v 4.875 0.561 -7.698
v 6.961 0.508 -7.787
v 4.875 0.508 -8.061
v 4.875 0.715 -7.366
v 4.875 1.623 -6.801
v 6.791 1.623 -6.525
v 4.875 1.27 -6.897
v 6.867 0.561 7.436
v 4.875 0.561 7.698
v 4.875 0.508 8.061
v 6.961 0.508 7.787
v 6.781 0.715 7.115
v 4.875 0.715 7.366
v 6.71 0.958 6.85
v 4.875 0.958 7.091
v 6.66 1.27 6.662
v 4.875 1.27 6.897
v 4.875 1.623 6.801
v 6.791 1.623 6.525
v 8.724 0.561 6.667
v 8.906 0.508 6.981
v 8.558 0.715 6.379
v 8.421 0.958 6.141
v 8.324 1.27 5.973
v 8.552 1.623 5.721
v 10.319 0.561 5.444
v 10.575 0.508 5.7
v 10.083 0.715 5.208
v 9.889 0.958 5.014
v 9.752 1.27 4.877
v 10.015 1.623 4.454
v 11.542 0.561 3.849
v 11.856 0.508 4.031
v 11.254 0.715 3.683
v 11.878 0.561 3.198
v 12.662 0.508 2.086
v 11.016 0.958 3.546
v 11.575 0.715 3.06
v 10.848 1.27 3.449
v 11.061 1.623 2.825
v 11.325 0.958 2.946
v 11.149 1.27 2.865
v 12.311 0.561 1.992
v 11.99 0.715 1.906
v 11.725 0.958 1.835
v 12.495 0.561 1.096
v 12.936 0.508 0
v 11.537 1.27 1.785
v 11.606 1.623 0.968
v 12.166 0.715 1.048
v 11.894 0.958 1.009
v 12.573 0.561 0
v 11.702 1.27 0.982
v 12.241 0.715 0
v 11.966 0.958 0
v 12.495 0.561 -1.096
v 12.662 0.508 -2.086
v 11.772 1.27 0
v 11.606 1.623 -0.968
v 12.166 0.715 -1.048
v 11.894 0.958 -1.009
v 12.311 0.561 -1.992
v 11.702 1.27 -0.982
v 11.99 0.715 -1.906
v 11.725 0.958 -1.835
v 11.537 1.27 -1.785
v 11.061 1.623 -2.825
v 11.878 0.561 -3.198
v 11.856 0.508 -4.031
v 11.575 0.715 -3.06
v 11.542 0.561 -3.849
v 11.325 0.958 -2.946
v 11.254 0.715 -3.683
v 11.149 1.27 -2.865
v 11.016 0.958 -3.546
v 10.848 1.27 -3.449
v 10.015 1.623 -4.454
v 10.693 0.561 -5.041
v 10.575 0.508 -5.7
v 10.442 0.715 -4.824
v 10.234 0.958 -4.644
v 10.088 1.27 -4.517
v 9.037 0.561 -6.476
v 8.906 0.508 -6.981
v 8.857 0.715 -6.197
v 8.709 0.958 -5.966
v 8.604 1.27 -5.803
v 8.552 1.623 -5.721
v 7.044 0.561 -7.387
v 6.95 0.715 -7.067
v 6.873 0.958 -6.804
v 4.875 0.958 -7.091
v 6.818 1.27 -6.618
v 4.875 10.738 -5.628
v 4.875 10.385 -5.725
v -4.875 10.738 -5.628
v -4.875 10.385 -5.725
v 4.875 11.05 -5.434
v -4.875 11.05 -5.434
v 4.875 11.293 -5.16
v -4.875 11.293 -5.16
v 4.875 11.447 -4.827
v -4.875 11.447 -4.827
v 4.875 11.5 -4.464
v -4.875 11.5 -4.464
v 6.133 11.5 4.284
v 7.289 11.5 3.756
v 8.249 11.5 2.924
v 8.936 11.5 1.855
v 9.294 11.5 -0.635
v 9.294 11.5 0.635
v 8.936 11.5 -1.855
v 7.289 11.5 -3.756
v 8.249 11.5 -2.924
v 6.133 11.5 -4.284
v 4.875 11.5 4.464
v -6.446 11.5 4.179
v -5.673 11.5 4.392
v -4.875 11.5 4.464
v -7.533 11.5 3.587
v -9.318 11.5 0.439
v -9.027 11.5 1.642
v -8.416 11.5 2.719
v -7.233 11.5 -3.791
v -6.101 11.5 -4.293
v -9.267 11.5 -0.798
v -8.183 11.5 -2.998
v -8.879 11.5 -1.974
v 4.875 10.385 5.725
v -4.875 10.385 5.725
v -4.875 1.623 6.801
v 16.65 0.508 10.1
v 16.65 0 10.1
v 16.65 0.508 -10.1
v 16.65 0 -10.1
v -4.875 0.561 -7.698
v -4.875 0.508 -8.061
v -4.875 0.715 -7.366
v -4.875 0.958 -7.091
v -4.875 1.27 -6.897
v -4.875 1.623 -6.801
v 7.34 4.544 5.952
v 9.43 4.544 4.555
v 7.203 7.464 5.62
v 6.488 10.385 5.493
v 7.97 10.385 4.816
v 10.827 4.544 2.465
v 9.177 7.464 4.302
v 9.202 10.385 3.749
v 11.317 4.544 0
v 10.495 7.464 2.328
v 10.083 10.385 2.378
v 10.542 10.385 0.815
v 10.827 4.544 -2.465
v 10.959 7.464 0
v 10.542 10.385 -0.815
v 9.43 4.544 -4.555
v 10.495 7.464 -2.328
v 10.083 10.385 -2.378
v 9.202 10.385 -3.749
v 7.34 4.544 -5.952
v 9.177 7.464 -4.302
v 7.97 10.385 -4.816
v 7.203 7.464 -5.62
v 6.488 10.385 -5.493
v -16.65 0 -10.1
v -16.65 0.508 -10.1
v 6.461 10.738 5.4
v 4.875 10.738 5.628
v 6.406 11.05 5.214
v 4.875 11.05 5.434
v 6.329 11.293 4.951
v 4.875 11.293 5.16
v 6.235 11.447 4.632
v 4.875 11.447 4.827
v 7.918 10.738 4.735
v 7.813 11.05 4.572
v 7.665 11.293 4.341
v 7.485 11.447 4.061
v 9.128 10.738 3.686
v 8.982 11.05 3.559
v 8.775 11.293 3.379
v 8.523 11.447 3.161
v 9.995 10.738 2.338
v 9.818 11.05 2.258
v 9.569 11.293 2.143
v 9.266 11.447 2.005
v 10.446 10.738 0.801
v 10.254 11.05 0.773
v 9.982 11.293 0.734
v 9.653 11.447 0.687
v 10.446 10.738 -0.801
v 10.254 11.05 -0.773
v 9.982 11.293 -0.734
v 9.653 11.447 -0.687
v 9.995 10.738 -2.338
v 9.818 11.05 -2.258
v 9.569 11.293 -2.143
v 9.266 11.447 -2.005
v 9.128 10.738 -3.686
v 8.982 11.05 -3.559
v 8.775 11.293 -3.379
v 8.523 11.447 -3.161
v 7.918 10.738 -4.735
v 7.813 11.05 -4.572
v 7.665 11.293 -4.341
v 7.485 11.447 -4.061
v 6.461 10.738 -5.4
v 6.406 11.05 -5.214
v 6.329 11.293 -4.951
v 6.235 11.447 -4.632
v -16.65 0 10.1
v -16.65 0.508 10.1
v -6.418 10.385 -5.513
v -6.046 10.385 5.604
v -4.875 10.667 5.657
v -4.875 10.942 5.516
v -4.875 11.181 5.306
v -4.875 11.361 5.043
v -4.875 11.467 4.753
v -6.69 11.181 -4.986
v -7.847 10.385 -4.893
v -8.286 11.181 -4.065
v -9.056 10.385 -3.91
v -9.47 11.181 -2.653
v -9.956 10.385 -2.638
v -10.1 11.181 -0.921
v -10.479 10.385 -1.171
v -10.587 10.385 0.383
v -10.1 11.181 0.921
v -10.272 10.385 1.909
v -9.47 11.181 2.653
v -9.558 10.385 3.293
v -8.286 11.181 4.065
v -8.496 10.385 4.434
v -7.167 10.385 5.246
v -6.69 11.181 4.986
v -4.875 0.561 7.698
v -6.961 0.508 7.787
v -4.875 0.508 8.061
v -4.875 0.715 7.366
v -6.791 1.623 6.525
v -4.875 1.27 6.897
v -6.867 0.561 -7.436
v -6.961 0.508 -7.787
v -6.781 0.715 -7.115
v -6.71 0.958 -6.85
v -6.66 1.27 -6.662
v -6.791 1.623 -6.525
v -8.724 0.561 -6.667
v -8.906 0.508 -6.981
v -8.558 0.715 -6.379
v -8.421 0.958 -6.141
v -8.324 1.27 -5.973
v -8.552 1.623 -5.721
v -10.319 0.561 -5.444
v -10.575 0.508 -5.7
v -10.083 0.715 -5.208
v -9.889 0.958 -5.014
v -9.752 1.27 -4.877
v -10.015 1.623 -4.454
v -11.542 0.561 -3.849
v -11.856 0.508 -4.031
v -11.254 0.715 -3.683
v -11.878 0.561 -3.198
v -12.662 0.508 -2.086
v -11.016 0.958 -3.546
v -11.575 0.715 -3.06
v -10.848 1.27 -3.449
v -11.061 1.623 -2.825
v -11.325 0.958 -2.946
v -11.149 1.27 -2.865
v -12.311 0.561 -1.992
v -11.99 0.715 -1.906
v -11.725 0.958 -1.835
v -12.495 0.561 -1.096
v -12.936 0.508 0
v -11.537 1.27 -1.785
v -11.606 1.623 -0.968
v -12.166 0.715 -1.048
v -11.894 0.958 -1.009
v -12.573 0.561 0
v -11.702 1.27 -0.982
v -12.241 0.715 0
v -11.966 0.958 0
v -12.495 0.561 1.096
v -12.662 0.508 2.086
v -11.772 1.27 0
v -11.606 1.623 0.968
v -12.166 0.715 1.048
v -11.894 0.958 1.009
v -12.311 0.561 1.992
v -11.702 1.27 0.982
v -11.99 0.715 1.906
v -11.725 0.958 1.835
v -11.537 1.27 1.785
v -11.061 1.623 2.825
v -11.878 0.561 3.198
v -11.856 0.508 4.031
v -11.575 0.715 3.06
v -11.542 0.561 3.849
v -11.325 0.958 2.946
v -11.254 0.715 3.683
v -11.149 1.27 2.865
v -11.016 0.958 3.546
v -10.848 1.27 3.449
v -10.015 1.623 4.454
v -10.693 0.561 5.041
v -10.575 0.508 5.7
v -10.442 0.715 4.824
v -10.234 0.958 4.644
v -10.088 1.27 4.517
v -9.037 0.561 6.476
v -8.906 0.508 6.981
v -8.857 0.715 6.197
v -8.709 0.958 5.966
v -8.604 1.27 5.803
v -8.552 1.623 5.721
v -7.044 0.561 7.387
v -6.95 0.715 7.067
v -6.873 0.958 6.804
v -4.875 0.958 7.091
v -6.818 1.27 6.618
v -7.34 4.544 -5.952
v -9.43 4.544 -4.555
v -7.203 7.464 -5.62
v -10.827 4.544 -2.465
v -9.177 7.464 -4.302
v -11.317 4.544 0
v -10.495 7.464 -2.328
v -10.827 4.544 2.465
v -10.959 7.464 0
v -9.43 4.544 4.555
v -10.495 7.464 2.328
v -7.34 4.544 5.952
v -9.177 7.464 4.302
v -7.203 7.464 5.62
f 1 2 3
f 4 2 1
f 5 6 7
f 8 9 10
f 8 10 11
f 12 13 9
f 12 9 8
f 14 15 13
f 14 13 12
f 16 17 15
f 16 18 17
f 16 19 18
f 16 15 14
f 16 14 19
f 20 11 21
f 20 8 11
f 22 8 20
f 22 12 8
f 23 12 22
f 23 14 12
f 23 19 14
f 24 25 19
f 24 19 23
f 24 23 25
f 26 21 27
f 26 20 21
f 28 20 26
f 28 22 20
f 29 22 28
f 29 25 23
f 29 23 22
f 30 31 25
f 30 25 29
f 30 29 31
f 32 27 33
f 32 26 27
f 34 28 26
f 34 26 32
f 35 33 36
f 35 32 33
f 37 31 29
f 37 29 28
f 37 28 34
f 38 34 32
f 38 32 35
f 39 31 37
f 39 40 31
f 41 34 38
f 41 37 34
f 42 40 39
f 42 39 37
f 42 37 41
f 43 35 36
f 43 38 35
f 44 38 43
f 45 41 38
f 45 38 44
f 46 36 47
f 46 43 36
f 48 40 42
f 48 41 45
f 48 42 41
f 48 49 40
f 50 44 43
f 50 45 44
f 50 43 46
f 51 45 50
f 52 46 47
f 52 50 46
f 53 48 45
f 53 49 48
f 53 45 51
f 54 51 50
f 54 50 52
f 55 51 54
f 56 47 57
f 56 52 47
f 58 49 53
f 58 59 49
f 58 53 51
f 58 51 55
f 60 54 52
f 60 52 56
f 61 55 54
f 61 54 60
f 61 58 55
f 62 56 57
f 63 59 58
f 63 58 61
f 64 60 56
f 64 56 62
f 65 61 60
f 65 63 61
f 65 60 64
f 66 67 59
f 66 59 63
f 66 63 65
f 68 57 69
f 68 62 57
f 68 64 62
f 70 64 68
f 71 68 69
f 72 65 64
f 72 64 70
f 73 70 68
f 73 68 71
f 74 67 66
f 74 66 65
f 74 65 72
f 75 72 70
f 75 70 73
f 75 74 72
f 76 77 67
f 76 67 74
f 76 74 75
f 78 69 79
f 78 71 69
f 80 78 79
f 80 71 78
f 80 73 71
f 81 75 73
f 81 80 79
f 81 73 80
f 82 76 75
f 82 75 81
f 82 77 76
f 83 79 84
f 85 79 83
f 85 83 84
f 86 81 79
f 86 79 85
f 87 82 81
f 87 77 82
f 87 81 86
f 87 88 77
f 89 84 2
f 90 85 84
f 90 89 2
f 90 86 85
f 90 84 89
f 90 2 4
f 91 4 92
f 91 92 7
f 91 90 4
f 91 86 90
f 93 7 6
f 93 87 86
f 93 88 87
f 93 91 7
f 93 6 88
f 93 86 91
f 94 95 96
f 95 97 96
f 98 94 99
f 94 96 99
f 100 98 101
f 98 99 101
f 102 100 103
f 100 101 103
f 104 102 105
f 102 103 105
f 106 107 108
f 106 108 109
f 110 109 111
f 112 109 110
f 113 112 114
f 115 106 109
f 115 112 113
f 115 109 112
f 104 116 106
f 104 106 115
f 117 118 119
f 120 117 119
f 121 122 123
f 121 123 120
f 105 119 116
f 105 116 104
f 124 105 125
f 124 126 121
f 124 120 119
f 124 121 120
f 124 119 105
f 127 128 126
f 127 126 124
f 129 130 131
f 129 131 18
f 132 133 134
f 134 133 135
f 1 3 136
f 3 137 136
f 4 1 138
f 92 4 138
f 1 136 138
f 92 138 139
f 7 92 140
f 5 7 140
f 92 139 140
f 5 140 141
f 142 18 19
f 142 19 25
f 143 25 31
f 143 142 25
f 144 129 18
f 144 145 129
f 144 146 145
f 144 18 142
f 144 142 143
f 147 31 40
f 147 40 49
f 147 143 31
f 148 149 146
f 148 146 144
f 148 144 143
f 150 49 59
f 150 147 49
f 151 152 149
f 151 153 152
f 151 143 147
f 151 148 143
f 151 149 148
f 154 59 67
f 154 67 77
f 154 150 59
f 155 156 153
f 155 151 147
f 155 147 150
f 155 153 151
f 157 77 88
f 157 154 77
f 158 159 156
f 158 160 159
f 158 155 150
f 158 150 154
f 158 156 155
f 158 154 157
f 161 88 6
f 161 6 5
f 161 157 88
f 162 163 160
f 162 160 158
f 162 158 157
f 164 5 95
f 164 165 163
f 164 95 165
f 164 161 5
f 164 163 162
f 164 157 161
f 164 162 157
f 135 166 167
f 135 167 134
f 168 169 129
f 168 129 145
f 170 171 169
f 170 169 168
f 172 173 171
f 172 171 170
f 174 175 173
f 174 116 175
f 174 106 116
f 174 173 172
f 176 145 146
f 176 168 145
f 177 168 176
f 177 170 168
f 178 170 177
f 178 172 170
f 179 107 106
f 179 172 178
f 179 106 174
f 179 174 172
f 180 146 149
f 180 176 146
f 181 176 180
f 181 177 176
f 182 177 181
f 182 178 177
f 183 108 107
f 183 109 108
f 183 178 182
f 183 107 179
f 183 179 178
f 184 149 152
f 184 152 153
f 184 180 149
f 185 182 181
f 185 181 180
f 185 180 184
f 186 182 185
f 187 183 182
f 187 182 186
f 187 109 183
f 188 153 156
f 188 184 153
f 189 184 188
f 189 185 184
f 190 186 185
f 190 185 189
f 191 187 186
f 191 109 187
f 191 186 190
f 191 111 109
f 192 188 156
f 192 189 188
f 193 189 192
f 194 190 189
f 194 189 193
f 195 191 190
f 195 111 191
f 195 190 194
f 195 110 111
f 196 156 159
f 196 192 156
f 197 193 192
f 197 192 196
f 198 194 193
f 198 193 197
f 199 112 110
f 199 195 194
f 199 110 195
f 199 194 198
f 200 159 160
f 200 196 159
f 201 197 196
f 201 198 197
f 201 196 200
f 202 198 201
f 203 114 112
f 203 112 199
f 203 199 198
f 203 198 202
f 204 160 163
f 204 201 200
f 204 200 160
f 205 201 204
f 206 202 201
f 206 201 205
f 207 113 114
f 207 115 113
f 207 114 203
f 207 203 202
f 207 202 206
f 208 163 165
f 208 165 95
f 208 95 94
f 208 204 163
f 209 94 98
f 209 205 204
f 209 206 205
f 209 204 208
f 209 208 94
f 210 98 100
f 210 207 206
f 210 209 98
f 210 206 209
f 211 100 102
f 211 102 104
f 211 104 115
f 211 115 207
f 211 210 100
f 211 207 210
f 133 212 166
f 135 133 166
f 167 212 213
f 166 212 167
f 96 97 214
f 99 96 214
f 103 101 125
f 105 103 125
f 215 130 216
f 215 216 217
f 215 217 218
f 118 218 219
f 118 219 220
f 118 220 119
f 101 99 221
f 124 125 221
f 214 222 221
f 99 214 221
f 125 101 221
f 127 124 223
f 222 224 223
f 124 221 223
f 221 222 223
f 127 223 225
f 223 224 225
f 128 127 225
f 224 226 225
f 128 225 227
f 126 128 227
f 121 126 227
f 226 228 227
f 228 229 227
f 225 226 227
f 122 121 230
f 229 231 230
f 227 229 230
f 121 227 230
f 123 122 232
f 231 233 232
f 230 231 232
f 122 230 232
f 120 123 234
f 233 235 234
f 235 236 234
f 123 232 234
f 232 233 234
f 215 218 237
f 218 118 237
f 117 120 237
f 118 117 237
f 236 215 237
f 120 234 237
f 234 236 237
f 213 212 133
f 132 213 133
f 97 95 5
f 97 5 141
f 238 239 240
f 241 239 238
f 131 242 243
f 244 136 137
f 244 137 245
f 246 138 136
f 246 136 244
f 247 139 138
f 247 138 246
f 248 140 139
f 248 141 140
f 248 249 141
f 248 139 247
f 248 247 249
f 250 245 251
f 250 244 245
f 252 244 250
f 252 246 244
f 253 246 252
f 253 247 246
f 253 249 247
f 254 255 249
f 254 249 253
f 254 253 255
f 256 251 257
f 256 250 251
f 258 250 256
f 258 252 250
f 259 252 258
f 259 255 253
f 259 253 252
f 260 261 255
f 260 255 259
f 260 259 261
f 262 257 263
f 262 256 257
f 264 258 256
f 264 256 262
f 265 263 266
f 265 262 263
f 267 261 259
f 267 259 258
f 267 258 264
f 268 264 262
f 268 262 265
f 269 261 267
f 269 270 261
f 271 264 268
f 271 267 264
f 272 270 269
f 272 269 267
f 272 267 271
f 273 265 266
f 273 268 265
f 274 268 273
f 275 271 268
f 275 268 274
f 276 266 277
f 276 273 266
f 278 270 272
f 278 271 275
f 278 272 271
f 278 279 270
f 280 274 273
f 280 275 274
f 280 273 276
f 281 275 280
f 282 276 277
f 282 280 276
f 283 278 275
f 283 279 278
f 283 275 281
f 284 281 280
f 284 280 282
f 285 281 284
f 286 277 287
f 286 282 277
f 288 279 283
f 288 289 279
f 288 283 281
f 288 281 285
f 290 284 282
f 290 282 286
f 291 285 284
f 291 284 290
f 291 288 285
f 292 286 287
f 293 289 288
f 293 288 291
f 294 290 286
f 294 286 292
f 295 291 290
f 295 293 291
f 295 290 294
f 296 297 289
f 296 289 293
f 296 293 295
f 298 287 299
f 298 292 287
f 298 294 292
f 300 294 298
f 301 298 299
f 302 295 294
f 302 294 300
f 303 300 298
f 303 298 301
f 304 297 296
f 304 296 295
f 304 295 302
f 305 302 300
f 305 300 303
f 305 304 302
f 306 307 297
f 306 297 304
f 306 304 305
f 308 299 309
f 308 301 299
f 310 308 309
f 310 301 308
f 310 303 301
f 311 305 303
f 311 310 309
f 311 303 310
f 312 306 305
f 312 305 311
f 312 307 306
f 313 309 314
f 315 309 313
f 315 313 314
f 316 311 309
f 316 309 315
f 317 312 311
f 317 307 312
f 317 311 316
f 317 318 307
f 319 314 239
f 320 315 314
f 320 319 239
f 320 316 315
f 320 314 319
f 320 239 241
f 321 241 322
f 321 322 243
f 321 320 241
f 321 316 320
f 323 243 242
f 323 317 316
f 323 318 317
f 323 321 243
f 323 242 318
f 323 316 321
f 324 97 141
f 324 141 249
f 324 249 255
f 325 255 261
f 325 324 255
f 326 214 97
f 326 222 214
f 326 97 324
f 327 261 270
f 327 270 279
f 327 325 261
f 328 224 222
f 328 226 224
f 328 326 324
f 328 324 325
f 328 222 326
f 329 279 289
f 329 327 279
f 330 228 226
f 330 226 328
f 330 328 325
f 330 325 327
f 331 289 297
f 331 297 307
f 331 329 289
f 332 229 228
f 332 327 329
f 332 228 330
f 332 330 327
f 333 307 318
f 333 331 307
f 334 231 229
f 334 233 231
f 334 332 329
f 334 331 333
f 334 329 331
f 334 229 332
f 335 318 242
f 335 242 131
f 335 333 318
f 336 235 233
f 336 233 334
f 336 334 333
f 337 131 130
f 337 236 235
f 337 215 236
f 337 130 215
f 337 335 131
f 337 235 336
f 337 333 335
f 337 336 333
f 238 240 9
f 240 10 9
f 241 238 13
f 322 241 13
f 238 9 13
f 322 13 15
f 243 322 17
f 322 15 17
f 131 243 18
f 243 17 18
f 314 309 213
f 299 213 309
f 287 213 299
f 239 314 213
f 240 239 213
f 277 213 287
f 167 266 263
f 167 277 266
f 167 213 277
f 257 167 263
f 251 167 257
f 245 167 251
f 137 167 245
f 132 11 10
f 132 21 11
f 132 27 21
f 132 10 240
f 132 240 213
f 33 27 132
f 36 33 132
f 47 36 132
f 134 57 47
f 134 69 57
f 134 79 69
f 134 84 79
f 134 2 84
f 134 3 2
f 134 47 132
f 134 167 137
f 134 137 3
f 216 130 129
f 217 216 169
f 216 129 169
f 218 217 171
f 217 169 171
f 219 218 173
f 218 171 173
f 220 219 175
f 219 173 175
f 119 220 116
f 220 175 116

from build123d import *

# Parameters (mm, degrees)
SKETCH1_W           = 33.3
SKETCH1_H           = 20.2
BOSS_EXTRUDE1_DEPTH = 0.508
BOSS_EXTRUDE2_DEPTH = 11.5
BOSS_EXTRUDE2_TAPER = 7
FILLET1_R           = 1.27
FILLET4_R           = 1.27


with BuildPart() as part:
    # Sketch1 → Boss-Extrude1 (new body)
    with BuildSketch(Plane(origin=(0, 0, 0), x_dir=(1, 0, 0), z_dir=(0, 1, 0))):
        Rectangle(SKETCH1_W, SKETCH1_H)
    extrude(amount=BOSS_EXTRUDE1_DEPTH)

    # Sketch2 → Boss-Extrude2 (add)
    with BuildSketch(Plane(origin=(0, 0, 0), x_dir=(1, 0, 0), z_dir=(0, 1, 0))):
        with BuildLine():
            ThreePointArc((-4.875, 7), (-11.875, 0), (-4.875, -7))
            Line((-4.875, -7), (4.875, -7))
            ThreePointArc((4.875, -7), (11.875, 0), (4.875, 7))
            Line((4.875, 7), (-4.875, 7))
        make_face()
    extrude(amount=BOSS_EXTRUDE2_DEPTH, taper=BOSS_EXTRUDE2_TAPER)

    # Fillet1
    fillet1_edges = [part.edges().sort_by_distance(p)[0] for p in [
        (10.46297755, 11.5, 0),
        (0, 11.5, -5.58797755),
        (-10.46297755, 11.5, 0),
        (0, 11.5, 5.58797755),
    ]]
    fillet(fillet1_edges, radius=FILLET1_R)

    # Fillet4
    fillet4_edges = [part.edges().sort_by_distance(p)[0] for p in [
        (11.812625443, 0.508, 0),
        (0, 0.508, -6.937625443),
        (-11.812625443, 0.508, 0),
        (0, 0.508, 6.937625443),
    ]]
    fillet(fillet4_edges, radius=FILLET4_R)


solid = part.part
